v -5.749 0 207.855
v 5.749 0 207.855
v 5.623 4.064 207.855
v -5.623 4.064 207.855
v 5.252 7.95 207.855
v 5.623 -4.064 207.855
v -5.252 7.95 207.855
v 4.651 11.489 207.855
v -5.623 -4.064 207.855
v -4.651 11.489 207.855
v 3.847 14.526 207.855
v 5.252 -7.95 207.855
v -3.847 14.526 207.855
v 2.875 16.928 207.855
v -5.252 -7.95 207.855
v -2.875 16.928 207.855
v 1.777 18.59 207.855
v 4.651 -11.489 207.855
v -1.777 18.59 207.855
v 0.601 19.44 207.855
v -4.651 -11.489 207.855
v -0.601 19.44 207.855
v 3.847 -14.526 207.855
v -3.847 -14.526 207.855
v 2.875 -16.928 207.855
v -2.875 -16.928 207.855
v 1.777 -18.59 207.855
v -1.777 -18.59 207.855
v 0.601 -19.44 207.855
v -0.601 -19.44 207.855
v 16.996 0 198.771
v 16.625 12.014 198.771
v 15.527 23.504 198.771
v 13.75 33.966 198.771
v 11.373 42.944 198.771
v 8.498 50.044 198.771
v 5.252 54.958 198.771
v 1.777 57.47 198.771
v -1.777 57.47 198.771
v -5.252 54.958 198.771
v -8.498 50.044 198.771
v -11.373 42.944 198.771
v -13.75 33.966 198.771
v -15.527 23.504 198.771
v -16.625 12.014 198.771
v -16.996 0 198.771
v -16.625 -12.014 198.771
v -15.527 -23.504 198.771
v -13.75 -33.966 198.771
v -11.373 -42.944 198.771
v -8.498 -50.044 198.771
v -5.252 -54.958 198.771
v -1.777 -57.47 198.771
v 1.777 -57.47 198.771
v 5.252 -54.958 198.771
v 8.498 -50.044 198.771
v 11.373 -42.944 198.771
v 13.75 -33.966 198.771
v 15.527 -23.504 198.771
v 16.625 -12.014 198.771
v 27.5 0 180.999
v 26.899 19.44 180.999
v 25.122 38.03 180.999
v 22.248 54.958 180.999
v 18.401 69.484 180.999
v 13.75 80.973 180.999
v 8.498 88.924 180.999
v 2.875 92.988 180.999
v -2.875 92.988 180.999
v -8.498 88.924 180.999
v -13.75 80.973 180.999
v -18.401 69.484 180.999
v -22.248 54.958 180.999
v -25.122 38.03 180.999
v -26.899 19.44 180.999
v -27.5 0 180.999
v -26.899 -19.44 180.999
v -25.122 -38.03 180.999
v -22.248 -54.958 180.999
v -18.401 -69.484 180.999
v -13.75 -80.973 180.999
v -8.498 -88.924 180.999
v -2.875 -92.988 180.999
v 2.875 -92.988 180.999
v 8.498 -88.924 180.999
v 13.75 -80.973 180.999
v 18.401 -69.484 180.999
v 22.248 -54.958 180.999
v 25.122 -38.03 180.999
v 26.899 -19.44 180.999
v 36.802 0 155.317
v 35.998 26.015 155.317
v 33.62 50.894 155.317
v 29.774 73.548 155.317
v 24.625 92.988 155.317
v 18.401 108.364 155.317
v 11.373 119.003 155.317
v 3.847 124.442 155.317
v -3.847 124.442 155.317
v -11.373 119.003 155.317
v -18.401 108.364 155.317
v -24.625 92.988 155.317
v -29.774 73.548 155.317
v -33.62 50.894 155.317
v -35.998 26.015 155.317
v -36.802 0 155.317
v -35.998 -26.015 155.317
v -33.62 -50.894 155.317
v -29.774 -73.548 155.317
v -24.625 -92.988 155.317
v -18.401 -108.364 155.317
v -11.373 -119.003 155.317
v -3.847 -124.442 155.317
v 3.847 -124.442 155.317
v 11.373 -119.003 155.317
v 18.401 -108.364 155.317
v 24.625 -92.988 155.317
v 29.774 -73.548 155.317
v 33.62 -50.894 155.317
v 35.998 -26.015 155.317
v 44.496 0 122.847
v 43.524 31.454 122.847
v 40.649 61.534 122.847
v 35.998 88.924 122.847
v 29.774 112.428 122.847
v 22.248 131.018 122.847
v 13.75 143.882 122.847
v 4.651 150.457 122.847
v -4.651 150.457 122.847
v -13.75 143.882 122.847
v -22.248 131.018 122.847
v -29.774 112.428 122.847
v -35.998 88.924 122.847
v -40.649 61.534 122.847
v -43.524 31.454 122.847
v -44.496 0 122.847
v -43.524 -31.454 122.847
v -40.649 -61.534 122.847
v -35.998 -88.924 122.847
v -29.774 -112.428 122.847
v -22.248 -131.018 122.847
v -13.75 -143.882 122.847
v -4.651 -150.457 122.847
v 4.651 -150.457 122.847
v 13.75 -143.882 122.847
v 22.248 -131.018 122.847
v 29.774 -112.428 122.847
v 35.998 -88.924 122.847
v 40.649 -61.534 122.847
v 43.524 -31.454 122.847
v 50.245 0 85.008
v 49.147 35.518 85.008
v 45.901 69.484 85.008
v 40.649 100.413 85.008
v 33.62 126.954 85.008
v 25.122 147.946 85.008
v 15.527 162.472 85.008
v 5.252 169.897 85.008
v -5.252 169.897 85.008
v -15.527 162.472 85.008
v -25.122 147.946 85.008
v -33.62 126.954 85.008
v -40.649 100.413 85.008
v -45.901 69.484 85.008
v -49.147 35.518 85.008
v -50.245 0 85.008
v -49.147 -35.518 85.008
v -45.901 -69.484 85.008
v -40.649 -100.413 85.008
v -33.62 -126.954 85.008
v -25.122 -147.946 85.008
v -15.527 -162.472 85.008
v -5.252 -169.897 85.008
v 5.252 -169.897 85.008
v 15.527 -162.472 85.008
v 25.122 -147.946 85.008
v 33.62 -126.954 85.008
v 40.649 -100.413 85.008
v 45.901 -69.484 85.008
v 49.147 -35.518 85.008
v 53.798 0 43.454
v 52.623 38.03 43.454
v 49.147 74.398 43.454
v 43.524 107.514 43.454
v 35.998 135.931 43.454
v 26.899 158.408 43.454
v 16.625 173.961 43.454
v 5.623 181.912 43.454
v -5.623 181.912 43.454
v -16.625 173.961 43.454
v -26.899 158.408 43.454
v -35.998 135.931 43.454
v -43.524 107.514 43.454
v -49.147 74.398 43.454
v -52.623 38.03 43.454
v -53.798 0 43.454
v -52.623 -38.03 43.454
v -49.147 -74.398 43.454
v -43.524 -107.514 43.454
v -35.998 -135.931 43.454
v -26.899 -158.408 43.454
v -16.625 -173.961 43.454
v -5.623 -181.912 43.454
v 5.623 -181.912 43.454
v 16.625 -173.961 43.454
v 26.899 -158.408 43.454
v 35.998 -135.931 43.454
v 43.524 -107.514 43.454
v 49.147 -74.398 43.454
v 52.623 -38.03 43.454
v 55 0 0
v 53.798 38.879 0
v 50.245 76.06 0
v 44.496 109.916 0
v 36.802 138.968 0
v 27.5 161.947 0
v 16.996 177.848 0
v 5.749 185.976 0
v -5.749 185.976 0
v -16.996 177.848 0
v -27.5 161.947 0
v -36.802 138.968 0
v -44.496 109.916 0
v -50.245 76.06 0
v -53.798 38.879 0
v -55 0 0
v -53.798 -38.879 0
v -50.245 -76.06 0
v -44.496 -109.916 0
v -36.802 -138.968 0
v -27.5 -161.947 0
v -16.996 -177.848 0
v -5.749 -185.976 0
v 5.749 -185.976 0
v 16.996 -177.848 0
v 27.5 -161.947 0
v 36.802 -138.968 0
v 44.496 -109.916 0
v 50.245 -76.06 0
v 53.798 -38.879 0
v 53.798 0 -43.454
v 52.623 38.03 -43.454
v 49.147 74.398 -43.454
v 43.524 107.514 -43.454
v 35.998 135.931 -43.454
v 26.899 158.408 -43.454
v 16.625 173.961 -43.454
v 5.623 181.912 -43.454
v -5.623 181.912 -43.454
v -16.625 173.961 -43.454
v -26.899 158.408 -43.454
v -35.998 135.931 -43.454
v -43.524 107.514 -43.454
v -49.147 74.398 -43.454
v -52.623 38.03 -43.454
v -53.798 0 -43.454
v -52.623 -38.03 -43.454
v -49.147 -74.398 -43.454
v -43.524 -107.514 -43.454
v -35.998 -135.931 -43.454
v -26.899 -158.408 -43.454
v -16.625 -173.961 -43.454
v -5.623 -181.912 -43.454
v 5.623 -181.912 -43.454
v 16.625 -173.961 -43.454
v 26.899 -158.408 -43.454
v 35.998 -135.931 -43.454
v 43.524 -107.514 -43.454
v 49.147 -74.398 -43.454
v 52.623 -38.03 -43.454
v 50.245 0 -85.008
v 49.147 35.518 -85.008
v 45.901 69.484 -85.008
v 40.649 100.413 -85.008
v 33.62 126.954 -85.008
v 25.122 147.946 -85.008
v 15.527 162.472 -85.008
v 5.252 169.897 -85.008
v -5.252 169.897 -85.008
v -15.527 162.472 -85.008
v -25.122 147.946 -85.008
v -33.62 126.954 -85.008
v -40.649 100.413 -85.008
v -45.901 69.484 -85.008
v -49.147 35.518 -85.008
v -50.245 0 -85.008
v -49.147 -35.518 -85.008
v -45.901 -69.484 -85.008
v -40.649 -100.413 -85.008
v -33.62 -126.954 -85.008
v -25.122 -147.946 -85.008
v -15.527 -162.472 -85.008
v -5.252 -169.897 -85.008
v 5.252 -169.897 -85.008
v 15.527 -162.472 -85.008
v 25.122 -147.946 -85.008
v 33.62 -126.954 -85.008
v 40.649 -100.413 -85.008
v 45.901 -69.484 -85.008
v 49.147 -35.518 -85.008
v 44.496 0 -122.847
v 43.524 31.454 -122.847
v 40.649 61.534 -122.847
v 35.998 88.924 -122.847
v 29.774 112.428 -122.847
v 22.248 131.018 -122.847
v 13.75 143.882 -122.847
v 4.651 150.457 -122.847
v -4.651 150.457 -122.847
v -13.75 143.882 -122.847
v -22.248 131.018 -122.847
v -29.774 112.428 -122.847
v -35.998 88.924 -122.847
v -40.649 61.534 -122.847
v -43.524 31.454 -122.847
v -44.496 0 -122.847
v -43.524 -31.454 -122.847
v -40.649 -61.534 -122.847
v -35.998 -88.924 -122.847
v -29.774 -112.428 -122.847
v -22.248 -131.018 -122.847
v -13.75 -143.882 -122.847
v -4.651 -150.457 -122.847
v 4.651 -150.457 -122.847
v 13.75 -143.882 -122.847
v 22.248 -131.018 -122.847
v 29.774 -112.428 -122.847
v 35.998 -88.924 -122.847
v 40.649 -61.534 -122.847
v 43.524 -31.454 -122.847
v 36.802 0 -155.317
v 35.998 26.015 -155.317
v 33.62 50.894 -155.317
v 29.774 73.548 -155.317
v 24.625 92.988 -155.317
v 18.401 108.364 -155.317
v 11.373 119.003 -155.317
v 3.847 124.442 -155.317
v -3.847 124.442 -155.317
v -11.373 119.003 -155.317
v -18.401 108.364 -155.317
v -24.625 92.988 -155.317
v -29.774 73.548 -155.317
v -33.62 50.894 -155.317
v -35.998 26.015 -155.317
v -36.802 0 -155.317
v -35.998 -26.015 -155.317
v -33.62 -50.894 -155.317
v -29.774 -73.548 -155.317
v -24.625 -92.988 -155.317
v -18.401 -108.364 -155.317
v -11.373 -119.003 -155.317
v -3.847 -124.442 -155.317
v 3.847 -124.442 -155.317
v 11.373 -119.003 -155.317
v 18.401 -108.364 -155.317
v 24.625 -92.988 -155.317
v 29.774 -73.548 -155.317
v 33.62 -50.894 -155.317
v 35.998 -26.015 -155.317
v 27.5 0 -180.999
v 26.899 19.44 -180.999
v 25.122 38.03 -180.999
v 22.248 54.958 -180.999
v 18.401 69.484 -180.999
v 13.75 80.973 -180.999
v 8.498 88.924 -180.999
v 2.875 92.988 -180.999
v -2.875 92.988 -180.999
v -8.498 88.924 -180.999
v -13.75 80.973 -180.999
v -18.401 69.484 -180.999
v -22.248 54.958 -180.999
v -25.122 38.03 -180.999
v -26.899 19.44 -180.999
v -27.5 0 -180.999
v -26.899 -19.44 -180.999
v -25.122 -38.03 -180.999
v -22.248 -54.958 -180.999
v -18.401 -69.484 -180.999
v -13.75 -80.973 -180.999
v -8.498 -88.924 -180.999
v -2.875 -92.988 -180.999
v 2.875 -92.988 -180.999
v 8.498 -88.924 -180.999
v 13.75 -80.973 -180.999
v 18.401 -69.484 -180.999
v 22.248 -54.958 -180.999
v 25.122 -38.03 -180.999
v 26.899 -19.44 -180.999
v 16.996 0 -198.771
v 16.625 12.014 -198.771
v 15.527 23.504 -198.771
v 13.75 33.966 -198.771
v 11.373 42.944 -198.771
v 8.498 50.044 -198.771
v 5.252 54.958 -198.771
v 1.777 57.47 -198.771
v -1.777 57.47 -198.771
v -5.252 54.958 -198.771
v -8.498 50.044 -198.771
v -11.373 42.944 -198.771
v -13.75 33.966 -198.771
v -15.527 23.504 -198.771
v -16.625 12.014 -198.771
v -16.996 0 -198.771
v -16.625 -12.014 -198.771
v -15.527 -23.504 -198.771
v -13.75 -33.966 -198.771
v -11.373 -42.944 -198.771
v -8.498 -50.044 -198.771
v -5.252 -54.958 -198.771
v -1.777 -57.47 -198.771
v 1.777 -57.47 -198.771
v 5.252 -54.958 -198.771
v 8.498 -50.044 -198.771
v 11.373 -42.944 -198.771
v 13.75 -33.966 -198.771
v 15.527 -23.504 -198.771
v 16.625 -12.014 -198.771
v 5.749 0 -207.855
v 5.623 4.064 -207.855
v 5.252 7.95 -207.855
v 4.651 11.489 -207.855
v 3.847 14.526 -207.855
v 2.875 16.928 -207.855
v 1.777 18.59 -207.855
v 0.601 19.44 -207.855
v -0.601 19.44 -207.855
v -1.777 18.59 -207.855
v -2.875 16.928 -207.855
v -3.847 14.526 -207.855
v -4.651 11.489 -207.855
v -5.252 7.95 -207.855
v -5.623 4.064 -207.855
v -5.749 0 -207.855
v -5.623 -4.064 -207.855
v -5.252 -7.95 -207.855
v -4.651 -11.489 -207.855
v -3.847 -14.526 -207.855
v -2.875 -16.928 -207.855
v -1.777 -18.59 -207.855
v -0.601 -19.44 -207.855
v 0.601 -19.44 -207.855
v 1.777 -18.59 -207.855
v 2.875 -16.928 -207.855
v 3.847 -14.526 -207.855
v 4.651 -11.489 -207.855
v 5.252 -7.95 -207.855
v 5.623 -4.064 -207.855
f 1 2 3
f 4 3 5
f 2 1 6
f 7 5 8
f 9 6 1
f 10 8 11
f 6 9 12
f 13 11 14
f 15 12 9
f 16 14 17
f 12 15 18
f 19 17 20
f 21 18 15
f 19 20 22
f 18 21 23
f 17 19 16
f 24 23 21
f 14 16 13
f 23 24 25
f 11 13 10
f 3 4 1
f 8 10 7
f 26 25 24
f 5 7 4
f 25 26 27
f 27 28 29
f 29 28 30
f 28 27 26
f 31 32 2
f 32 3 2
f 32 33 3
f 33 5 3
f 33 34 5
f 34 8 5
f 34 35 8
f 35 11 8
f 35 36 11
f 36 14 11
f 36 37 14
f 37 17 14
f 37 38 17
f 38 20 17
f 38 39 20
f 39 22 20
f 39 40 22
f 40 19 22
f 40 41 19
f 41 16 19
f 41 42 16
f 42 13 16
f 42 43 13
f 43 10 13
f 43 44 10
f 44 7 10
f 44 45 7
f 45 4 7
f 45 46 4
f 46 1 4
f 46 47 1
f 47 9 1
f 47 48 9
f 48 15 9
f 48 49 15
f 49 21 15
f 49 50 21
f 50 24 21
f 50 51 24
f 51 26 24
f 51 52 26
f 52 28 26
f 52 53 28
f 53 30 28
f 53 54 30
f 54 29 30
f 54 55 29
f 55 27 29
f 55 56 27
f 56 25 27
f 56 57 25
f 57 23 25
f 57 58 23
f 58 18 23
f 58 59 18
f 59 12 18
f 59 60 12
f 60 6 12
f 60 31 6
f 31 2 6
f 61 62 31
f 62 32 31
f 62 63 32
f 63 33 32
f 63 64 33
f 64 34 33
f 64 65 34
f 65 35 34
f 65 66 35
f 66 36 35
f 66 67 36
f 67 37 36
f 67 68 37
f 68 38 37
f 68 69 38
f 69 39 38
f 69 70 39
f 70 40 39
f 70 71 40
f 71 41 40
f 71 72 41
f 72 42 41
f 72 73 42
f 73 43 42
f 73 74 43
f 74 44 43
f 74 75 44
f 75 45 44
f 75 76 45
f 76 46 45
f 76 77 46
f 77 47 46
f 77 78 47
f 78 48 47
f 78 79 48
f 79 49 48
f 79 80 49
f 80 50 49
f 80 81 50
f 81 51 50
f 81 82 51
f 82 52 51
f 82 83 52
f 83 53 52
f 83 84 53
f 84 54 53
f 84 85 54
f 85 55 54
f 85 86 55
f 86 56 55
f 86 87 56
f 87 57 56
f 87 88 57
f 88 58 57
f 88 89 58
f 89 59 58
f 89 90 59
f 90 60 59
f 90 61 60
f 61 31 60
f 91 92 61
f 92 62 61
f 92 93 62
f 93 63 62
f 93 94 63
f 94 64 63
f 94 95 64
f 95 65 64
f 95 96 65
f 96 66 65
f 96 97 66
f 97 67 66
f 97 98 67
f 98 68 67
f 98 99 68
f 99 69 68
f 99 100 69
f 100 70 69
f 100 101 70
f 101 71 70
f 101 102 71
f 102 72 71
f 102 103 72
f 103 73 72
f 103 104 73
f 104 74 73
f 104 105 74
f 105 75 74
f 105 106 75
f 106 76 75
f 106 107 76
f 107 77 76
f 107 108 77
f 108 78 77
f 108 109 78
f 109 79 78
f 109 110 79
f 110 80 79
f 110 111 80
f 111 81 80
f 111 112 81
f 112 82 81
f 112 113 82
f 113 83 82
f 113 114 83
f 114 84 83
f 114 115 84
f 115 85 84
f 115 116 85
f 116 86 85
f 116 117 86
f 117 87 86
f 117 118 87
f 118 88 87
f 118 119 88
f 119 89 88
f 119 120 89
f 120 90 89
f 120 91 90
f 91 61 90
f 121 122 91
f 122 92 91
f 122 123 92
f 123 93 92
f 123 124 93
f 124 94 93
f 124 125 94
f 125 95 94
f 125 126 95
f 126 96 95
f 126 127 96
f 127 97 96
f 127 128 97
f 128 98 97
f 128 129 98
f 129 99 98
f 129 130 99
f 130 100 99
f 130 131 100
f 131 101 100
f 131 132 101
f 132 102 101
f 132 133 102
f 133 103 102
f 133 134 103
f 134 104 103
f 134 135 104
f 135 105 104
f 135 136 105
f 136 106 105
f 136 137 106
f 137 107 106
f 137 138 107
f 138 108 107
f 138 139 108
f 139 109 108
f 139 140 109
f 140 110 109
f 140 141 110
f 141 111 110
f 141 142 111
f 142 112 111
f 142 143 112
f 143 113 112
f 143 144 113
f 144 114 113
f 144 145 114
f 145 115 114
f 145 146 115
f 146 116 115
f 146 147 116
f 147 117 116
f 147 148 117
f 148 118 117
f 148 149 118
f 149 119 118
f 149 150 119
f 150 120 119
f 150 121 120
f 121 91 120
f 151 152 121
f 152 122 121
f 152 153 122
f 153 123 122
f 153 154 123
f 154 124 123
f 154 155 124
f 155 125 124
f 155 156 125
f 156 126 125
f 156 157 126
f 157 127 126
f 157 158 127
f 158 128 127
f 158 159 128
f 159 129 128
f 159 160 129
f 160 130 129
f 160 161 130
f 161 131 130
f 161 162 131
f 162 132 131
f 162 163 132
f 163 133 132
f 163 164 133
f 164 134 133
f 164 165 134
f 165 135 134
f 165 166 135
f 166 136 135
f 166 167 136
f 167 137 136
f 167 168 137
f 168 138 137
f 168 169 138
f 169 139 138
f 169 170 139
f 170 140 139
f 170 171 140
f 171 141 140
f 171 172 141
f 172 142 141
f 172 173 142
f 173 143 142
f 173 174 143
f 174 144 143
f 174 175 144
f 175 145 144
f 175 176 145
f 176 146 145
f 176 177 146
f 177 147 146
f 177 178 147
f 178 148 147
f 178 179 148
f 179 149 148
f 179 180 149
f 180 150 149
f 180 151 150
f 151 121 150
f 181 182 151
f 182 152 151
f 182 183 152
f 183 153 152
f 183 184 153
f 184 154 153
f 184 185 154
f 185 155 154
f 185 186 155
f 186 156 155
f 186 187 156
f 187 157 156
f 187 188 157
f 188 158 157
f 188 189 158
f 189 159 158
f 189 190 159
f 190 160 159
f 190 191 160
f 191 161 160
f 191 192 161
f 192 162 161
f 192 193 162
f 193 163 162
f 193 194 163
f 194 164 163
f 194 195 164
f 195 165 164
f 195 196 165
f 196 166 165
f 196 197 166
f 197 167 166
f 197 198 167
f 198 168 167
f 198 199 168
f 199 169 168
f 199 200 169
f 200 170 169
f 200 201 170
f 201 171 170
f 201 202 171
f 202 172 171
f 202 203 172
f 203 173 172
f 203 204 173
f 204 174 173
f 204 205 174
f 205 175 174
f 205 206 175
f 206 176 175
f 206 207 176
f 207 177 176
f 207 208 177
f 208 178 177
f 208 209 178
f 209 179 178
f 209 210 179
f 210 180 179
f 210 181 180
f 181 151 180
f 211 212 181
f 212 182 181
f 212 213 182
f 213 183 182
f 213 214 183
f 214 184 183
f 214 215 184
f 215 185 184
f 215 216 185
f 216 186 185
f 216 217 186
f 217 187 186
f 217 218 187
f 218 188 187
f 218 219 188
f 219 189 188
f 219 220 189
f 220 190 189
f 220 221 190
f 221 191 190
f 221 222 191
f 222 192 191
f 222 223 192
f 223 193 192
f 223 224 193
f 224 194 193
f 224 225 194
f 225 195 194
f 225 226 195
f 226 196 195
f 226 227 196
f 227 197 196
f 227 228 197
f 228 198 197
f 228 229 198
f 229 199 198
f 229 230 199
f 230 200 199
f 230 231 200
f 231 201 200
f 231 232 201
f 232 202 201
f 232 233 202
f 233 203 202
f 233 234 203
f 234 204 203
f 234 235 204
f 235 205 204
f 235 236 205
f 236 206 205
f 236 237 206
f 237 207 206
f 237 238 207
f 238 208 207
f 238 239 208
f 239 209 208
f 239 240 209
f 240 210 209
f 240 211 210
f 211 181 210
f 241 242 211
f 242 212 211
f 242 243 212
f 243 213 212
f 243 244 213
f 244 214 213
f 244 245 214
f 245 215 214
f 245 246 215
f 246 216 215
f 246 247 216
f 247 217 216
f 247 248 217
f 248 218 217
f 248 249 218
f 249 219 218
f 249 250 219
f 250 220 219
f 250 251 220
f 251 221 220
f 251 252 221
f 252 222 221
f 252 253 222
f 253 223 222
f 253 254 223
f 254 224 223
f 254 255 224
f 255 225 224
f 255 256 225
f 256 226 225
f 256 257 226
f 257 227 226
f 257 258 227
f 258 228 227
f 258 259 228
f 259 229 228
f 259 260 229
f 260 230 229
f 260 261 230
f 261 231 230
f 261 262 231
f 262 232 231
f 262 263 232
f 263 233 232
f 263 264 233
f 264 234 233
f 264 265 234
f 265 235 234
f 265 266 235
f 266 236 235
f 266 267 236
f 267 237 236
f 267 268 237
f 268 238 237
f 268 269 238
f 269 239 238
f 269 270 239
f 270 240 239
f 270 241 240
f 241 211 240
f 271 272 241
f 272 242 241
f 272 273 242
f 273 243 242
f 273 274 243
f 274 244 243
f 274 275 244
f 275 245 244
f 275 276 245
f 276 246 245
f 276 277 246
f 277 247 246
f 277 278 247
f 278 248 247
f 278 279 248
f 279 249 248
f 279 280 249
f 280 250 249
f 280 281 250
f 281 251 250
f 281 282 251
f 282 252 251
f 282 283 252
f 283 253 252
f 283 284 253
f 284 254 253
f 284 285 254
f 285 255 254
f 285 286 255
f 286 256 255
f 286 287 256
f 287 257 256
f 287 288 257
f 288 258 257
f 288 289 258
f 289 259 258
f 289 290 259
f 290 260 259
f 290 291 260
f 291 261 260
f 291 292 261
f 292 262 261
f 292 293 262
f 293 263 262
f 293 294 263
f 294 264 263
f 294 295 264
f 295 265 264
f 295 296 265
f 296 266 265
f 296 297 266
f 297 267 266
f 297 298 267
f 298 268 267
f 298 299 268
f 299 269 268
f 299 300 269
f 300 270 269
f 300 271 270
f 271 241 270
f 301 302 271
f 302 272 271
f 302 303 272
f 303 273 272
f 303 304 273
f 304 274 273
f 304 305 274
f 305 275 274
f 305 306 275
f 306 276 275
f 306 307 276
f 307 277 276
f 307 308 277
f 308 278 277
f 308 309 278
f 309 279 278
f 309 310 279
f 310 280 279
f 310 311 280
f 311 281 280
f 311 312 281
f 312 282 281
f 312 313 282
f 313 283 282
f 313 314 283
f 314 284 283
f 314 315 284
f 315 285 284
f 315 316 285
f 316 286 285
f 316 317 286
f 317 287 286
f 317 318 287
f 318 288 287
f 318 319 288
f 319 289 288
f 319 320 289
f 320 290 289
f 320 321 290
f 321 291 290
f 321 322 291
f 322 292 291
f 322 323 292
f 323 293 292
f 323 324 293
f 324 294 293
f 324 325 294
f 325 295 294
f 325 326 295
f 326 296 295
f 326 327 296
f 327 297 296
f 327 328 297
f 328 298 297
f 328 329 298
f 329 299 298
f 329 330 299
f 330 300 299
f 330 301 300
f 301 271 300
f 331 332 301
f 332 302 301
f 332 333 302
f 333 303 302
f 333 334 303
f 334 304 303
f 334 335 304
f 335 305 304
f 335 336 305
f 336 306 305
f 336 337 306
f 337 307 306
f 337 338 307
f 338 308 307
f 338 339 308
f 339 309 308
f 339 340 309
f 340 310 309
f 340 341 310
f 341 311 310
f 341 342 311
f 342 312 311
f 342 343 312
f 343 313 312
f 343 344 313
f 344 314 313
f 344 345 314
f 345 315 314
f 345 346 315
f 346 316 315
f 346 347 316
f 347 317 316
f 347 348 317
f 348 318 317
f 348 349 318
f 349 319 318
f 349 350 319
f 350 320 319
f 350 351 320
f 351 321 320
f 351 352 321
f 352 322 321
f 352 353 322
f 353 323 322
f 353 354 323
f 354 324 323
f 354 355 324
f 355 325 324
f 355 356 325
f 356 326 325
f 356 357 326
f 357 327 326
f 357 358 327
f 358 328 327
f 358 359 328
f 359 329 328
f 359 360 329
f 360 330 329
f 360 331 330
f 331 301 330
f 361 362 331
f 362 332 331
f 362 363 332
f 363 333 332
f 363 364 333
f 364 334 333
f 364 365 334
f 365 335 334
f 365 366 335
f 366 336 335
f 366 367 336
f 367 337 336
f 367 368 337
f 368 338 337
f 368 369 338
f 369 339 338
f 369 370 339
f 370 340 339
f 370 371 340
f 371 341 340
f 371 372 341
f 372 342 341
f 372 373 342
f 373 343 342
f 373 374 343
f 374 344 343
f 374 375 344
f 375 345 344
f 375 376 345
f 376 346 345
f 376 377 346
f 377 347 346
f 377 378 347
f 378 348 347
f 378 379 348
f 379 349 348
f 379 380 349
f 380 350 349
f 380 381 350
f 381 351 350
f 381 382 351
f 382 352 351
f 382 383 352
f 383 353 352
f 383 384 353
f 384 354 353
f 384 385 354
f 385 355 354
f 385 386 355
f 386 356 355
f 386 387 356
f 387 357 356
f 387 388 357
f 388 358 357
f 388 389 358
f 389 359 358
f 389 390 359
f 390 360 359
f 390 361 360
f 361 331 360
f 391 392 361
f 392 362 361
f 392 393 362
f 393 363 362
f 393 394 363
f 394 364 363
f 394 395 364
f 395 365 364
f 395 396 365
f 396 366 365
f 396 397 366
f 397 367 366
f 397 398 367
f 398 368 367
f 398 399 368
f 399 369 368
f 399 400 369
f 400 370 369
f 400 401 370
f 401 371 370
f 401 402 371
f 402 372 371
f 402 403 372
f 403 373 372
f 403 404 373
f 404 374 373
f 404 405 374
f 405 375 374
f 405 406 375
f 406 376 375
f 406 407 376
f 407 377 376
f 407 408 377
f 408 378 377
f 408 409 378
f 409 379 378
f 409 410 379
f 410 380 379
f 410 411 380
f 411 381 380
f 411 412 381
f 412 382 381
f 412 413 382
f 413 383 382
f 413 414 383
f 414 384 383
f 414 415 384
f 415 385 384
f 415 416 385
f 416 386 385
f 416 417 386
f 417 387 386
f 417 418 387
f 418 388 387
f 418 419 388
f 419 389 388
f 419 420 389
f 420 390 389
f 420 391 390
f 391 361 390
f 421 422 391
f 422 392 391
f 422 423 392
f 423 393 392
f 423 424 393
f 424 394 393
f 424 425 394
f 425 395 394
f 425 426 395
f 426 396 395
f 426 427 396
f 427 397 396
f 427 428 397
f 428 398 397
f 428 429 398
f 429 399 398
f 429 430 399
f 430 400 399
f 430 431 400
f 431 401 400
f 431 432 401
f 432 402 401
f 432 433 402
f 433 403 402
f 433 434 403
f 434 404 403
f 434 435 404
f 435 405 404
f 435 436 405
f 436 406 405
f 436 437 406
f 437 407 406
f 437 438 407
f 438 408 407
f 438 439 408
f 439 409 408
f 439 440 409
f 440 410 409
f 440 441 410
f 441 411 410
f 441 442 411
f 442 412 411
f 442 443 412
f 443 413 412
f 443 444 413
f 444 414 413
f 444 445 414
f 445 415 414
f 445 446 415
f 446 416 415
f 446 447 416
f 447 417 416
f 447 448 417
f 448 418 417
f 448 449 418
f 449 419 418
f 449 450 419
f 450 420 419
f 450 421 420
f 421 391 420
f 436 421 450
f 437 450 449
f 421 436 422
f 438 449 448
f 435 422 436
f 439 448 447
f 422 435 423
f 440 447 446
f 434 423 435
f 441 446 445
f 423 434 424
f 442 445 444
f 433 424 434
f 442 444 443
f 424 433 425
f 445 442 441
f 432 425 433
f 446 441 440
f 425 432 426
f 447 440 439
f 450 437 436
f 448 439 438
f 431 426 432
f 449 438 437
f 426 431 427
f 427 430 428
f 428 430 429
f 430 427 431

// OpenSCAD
// Generated by SolidPython 1.0.1 on 2020-07-29 00:46:47


scale(v = [5, 17, 19]) {
	sphere(r = 11);
}
/***********************************************
*********      SolidPython code:      **********
************************************************
 
# import packages: SolidPython
from solid import *
from solid.utils import *
from itertools import chain, combinations, permutations


class Resize:

    def __init__(self, scad_file):
        self.scad_file = scad_file
        #self.scad_file = import_scad(scad_file)
        # cone/cylinder param:
        self.r1 = 0
        self.r2 = 0
        self.h = 0
        # rectangular prism param:
        self.w = 0
        self.l = 0
        # ellipse param:
        self.r = 0

    # import OpenScad code (file name corresponds to shape)


    # classify shape + parameters
    def assign(self, param1, param2, param3):
        if self.scad_file == 'cone.scad':
            self.r1 = param1
            self.r2 = param2
            self.h = param3
        elif self.scad_file == 'cylinder.scad':
            self.r1 = param1
            self.r2 = param2
            self.h = param3
        elif self.scad_file == 'rectangularPrism.scad':
            self.h = param1
            self.l = param2
            self.w = param3
        else:
            self.r = param1
            self.h = param2

    # resize parameters
    def iterate(self):
        x = range(3, 20, 2)
        i = 1
        if self.scad_file == 'cone.scad':
            tempList = list(permutations(x, 2))
            for temp in tempList:
                param1 = temp[0]
                param2 = temp[1]
                filepath = 'produced_scad_files/' + 'cone' + str(param1) + '_' + str(param2) + '_' + '.scad'
                scad_render_to_file(cylinder(h=param1, r1=param2, r2=0), filepath)

        elif self.scad_file == 'cylinder.scad':
            tempList = list(permutations(x, 3))
            for temp in tempList:
                param1 = temp[0]
                param2 = temp[1]
                filepath = 'produced_scad_files/' + 'cylinder' + str(param1) + '_' + str(param2) + '_' + '.scad'
                scad_render_to_file(cylinder(h=param1, r1=param2, r2=param2), filepath)

        elif self.scad_file == 'rectangularPrism.scad':
            tempList = list(permutations(x, 3))
            for temp in tempList:
                param1 = temp[0]
                param2 = temp[1]
                param3 = temp[2]
                filepath = 'produced_scad_files/' + 'rectangularPrism' + str(param1) + '_' + str(param2) + '_' + str(
                    param3) + '.scad'
                scad_render_to_file(cube(size=(param1, param2, param3)), filepath)

        elif self.scad_file == 'ellipse.scad':
            tempList = list(permutations(x, 4))
            for temp in tempList:
                param1 = temp[0]
                param2 = temp[1]
                param3 = temp[2]
                param4 = temp[3]
                filepath = 'produced_scad_files/' + 'ellipse' + str(param1) + '_' + str(param2) + '_' + str(param3) + '_' + str(param4) + '.scad'
                scad_render_to_file(scale([param1, param2, param3])(sphere(r=param4)), filepath)

    def render_to_scadfile(self):
        scad_render_to_file(scad, 'example.scad') 
 
************************************************/
